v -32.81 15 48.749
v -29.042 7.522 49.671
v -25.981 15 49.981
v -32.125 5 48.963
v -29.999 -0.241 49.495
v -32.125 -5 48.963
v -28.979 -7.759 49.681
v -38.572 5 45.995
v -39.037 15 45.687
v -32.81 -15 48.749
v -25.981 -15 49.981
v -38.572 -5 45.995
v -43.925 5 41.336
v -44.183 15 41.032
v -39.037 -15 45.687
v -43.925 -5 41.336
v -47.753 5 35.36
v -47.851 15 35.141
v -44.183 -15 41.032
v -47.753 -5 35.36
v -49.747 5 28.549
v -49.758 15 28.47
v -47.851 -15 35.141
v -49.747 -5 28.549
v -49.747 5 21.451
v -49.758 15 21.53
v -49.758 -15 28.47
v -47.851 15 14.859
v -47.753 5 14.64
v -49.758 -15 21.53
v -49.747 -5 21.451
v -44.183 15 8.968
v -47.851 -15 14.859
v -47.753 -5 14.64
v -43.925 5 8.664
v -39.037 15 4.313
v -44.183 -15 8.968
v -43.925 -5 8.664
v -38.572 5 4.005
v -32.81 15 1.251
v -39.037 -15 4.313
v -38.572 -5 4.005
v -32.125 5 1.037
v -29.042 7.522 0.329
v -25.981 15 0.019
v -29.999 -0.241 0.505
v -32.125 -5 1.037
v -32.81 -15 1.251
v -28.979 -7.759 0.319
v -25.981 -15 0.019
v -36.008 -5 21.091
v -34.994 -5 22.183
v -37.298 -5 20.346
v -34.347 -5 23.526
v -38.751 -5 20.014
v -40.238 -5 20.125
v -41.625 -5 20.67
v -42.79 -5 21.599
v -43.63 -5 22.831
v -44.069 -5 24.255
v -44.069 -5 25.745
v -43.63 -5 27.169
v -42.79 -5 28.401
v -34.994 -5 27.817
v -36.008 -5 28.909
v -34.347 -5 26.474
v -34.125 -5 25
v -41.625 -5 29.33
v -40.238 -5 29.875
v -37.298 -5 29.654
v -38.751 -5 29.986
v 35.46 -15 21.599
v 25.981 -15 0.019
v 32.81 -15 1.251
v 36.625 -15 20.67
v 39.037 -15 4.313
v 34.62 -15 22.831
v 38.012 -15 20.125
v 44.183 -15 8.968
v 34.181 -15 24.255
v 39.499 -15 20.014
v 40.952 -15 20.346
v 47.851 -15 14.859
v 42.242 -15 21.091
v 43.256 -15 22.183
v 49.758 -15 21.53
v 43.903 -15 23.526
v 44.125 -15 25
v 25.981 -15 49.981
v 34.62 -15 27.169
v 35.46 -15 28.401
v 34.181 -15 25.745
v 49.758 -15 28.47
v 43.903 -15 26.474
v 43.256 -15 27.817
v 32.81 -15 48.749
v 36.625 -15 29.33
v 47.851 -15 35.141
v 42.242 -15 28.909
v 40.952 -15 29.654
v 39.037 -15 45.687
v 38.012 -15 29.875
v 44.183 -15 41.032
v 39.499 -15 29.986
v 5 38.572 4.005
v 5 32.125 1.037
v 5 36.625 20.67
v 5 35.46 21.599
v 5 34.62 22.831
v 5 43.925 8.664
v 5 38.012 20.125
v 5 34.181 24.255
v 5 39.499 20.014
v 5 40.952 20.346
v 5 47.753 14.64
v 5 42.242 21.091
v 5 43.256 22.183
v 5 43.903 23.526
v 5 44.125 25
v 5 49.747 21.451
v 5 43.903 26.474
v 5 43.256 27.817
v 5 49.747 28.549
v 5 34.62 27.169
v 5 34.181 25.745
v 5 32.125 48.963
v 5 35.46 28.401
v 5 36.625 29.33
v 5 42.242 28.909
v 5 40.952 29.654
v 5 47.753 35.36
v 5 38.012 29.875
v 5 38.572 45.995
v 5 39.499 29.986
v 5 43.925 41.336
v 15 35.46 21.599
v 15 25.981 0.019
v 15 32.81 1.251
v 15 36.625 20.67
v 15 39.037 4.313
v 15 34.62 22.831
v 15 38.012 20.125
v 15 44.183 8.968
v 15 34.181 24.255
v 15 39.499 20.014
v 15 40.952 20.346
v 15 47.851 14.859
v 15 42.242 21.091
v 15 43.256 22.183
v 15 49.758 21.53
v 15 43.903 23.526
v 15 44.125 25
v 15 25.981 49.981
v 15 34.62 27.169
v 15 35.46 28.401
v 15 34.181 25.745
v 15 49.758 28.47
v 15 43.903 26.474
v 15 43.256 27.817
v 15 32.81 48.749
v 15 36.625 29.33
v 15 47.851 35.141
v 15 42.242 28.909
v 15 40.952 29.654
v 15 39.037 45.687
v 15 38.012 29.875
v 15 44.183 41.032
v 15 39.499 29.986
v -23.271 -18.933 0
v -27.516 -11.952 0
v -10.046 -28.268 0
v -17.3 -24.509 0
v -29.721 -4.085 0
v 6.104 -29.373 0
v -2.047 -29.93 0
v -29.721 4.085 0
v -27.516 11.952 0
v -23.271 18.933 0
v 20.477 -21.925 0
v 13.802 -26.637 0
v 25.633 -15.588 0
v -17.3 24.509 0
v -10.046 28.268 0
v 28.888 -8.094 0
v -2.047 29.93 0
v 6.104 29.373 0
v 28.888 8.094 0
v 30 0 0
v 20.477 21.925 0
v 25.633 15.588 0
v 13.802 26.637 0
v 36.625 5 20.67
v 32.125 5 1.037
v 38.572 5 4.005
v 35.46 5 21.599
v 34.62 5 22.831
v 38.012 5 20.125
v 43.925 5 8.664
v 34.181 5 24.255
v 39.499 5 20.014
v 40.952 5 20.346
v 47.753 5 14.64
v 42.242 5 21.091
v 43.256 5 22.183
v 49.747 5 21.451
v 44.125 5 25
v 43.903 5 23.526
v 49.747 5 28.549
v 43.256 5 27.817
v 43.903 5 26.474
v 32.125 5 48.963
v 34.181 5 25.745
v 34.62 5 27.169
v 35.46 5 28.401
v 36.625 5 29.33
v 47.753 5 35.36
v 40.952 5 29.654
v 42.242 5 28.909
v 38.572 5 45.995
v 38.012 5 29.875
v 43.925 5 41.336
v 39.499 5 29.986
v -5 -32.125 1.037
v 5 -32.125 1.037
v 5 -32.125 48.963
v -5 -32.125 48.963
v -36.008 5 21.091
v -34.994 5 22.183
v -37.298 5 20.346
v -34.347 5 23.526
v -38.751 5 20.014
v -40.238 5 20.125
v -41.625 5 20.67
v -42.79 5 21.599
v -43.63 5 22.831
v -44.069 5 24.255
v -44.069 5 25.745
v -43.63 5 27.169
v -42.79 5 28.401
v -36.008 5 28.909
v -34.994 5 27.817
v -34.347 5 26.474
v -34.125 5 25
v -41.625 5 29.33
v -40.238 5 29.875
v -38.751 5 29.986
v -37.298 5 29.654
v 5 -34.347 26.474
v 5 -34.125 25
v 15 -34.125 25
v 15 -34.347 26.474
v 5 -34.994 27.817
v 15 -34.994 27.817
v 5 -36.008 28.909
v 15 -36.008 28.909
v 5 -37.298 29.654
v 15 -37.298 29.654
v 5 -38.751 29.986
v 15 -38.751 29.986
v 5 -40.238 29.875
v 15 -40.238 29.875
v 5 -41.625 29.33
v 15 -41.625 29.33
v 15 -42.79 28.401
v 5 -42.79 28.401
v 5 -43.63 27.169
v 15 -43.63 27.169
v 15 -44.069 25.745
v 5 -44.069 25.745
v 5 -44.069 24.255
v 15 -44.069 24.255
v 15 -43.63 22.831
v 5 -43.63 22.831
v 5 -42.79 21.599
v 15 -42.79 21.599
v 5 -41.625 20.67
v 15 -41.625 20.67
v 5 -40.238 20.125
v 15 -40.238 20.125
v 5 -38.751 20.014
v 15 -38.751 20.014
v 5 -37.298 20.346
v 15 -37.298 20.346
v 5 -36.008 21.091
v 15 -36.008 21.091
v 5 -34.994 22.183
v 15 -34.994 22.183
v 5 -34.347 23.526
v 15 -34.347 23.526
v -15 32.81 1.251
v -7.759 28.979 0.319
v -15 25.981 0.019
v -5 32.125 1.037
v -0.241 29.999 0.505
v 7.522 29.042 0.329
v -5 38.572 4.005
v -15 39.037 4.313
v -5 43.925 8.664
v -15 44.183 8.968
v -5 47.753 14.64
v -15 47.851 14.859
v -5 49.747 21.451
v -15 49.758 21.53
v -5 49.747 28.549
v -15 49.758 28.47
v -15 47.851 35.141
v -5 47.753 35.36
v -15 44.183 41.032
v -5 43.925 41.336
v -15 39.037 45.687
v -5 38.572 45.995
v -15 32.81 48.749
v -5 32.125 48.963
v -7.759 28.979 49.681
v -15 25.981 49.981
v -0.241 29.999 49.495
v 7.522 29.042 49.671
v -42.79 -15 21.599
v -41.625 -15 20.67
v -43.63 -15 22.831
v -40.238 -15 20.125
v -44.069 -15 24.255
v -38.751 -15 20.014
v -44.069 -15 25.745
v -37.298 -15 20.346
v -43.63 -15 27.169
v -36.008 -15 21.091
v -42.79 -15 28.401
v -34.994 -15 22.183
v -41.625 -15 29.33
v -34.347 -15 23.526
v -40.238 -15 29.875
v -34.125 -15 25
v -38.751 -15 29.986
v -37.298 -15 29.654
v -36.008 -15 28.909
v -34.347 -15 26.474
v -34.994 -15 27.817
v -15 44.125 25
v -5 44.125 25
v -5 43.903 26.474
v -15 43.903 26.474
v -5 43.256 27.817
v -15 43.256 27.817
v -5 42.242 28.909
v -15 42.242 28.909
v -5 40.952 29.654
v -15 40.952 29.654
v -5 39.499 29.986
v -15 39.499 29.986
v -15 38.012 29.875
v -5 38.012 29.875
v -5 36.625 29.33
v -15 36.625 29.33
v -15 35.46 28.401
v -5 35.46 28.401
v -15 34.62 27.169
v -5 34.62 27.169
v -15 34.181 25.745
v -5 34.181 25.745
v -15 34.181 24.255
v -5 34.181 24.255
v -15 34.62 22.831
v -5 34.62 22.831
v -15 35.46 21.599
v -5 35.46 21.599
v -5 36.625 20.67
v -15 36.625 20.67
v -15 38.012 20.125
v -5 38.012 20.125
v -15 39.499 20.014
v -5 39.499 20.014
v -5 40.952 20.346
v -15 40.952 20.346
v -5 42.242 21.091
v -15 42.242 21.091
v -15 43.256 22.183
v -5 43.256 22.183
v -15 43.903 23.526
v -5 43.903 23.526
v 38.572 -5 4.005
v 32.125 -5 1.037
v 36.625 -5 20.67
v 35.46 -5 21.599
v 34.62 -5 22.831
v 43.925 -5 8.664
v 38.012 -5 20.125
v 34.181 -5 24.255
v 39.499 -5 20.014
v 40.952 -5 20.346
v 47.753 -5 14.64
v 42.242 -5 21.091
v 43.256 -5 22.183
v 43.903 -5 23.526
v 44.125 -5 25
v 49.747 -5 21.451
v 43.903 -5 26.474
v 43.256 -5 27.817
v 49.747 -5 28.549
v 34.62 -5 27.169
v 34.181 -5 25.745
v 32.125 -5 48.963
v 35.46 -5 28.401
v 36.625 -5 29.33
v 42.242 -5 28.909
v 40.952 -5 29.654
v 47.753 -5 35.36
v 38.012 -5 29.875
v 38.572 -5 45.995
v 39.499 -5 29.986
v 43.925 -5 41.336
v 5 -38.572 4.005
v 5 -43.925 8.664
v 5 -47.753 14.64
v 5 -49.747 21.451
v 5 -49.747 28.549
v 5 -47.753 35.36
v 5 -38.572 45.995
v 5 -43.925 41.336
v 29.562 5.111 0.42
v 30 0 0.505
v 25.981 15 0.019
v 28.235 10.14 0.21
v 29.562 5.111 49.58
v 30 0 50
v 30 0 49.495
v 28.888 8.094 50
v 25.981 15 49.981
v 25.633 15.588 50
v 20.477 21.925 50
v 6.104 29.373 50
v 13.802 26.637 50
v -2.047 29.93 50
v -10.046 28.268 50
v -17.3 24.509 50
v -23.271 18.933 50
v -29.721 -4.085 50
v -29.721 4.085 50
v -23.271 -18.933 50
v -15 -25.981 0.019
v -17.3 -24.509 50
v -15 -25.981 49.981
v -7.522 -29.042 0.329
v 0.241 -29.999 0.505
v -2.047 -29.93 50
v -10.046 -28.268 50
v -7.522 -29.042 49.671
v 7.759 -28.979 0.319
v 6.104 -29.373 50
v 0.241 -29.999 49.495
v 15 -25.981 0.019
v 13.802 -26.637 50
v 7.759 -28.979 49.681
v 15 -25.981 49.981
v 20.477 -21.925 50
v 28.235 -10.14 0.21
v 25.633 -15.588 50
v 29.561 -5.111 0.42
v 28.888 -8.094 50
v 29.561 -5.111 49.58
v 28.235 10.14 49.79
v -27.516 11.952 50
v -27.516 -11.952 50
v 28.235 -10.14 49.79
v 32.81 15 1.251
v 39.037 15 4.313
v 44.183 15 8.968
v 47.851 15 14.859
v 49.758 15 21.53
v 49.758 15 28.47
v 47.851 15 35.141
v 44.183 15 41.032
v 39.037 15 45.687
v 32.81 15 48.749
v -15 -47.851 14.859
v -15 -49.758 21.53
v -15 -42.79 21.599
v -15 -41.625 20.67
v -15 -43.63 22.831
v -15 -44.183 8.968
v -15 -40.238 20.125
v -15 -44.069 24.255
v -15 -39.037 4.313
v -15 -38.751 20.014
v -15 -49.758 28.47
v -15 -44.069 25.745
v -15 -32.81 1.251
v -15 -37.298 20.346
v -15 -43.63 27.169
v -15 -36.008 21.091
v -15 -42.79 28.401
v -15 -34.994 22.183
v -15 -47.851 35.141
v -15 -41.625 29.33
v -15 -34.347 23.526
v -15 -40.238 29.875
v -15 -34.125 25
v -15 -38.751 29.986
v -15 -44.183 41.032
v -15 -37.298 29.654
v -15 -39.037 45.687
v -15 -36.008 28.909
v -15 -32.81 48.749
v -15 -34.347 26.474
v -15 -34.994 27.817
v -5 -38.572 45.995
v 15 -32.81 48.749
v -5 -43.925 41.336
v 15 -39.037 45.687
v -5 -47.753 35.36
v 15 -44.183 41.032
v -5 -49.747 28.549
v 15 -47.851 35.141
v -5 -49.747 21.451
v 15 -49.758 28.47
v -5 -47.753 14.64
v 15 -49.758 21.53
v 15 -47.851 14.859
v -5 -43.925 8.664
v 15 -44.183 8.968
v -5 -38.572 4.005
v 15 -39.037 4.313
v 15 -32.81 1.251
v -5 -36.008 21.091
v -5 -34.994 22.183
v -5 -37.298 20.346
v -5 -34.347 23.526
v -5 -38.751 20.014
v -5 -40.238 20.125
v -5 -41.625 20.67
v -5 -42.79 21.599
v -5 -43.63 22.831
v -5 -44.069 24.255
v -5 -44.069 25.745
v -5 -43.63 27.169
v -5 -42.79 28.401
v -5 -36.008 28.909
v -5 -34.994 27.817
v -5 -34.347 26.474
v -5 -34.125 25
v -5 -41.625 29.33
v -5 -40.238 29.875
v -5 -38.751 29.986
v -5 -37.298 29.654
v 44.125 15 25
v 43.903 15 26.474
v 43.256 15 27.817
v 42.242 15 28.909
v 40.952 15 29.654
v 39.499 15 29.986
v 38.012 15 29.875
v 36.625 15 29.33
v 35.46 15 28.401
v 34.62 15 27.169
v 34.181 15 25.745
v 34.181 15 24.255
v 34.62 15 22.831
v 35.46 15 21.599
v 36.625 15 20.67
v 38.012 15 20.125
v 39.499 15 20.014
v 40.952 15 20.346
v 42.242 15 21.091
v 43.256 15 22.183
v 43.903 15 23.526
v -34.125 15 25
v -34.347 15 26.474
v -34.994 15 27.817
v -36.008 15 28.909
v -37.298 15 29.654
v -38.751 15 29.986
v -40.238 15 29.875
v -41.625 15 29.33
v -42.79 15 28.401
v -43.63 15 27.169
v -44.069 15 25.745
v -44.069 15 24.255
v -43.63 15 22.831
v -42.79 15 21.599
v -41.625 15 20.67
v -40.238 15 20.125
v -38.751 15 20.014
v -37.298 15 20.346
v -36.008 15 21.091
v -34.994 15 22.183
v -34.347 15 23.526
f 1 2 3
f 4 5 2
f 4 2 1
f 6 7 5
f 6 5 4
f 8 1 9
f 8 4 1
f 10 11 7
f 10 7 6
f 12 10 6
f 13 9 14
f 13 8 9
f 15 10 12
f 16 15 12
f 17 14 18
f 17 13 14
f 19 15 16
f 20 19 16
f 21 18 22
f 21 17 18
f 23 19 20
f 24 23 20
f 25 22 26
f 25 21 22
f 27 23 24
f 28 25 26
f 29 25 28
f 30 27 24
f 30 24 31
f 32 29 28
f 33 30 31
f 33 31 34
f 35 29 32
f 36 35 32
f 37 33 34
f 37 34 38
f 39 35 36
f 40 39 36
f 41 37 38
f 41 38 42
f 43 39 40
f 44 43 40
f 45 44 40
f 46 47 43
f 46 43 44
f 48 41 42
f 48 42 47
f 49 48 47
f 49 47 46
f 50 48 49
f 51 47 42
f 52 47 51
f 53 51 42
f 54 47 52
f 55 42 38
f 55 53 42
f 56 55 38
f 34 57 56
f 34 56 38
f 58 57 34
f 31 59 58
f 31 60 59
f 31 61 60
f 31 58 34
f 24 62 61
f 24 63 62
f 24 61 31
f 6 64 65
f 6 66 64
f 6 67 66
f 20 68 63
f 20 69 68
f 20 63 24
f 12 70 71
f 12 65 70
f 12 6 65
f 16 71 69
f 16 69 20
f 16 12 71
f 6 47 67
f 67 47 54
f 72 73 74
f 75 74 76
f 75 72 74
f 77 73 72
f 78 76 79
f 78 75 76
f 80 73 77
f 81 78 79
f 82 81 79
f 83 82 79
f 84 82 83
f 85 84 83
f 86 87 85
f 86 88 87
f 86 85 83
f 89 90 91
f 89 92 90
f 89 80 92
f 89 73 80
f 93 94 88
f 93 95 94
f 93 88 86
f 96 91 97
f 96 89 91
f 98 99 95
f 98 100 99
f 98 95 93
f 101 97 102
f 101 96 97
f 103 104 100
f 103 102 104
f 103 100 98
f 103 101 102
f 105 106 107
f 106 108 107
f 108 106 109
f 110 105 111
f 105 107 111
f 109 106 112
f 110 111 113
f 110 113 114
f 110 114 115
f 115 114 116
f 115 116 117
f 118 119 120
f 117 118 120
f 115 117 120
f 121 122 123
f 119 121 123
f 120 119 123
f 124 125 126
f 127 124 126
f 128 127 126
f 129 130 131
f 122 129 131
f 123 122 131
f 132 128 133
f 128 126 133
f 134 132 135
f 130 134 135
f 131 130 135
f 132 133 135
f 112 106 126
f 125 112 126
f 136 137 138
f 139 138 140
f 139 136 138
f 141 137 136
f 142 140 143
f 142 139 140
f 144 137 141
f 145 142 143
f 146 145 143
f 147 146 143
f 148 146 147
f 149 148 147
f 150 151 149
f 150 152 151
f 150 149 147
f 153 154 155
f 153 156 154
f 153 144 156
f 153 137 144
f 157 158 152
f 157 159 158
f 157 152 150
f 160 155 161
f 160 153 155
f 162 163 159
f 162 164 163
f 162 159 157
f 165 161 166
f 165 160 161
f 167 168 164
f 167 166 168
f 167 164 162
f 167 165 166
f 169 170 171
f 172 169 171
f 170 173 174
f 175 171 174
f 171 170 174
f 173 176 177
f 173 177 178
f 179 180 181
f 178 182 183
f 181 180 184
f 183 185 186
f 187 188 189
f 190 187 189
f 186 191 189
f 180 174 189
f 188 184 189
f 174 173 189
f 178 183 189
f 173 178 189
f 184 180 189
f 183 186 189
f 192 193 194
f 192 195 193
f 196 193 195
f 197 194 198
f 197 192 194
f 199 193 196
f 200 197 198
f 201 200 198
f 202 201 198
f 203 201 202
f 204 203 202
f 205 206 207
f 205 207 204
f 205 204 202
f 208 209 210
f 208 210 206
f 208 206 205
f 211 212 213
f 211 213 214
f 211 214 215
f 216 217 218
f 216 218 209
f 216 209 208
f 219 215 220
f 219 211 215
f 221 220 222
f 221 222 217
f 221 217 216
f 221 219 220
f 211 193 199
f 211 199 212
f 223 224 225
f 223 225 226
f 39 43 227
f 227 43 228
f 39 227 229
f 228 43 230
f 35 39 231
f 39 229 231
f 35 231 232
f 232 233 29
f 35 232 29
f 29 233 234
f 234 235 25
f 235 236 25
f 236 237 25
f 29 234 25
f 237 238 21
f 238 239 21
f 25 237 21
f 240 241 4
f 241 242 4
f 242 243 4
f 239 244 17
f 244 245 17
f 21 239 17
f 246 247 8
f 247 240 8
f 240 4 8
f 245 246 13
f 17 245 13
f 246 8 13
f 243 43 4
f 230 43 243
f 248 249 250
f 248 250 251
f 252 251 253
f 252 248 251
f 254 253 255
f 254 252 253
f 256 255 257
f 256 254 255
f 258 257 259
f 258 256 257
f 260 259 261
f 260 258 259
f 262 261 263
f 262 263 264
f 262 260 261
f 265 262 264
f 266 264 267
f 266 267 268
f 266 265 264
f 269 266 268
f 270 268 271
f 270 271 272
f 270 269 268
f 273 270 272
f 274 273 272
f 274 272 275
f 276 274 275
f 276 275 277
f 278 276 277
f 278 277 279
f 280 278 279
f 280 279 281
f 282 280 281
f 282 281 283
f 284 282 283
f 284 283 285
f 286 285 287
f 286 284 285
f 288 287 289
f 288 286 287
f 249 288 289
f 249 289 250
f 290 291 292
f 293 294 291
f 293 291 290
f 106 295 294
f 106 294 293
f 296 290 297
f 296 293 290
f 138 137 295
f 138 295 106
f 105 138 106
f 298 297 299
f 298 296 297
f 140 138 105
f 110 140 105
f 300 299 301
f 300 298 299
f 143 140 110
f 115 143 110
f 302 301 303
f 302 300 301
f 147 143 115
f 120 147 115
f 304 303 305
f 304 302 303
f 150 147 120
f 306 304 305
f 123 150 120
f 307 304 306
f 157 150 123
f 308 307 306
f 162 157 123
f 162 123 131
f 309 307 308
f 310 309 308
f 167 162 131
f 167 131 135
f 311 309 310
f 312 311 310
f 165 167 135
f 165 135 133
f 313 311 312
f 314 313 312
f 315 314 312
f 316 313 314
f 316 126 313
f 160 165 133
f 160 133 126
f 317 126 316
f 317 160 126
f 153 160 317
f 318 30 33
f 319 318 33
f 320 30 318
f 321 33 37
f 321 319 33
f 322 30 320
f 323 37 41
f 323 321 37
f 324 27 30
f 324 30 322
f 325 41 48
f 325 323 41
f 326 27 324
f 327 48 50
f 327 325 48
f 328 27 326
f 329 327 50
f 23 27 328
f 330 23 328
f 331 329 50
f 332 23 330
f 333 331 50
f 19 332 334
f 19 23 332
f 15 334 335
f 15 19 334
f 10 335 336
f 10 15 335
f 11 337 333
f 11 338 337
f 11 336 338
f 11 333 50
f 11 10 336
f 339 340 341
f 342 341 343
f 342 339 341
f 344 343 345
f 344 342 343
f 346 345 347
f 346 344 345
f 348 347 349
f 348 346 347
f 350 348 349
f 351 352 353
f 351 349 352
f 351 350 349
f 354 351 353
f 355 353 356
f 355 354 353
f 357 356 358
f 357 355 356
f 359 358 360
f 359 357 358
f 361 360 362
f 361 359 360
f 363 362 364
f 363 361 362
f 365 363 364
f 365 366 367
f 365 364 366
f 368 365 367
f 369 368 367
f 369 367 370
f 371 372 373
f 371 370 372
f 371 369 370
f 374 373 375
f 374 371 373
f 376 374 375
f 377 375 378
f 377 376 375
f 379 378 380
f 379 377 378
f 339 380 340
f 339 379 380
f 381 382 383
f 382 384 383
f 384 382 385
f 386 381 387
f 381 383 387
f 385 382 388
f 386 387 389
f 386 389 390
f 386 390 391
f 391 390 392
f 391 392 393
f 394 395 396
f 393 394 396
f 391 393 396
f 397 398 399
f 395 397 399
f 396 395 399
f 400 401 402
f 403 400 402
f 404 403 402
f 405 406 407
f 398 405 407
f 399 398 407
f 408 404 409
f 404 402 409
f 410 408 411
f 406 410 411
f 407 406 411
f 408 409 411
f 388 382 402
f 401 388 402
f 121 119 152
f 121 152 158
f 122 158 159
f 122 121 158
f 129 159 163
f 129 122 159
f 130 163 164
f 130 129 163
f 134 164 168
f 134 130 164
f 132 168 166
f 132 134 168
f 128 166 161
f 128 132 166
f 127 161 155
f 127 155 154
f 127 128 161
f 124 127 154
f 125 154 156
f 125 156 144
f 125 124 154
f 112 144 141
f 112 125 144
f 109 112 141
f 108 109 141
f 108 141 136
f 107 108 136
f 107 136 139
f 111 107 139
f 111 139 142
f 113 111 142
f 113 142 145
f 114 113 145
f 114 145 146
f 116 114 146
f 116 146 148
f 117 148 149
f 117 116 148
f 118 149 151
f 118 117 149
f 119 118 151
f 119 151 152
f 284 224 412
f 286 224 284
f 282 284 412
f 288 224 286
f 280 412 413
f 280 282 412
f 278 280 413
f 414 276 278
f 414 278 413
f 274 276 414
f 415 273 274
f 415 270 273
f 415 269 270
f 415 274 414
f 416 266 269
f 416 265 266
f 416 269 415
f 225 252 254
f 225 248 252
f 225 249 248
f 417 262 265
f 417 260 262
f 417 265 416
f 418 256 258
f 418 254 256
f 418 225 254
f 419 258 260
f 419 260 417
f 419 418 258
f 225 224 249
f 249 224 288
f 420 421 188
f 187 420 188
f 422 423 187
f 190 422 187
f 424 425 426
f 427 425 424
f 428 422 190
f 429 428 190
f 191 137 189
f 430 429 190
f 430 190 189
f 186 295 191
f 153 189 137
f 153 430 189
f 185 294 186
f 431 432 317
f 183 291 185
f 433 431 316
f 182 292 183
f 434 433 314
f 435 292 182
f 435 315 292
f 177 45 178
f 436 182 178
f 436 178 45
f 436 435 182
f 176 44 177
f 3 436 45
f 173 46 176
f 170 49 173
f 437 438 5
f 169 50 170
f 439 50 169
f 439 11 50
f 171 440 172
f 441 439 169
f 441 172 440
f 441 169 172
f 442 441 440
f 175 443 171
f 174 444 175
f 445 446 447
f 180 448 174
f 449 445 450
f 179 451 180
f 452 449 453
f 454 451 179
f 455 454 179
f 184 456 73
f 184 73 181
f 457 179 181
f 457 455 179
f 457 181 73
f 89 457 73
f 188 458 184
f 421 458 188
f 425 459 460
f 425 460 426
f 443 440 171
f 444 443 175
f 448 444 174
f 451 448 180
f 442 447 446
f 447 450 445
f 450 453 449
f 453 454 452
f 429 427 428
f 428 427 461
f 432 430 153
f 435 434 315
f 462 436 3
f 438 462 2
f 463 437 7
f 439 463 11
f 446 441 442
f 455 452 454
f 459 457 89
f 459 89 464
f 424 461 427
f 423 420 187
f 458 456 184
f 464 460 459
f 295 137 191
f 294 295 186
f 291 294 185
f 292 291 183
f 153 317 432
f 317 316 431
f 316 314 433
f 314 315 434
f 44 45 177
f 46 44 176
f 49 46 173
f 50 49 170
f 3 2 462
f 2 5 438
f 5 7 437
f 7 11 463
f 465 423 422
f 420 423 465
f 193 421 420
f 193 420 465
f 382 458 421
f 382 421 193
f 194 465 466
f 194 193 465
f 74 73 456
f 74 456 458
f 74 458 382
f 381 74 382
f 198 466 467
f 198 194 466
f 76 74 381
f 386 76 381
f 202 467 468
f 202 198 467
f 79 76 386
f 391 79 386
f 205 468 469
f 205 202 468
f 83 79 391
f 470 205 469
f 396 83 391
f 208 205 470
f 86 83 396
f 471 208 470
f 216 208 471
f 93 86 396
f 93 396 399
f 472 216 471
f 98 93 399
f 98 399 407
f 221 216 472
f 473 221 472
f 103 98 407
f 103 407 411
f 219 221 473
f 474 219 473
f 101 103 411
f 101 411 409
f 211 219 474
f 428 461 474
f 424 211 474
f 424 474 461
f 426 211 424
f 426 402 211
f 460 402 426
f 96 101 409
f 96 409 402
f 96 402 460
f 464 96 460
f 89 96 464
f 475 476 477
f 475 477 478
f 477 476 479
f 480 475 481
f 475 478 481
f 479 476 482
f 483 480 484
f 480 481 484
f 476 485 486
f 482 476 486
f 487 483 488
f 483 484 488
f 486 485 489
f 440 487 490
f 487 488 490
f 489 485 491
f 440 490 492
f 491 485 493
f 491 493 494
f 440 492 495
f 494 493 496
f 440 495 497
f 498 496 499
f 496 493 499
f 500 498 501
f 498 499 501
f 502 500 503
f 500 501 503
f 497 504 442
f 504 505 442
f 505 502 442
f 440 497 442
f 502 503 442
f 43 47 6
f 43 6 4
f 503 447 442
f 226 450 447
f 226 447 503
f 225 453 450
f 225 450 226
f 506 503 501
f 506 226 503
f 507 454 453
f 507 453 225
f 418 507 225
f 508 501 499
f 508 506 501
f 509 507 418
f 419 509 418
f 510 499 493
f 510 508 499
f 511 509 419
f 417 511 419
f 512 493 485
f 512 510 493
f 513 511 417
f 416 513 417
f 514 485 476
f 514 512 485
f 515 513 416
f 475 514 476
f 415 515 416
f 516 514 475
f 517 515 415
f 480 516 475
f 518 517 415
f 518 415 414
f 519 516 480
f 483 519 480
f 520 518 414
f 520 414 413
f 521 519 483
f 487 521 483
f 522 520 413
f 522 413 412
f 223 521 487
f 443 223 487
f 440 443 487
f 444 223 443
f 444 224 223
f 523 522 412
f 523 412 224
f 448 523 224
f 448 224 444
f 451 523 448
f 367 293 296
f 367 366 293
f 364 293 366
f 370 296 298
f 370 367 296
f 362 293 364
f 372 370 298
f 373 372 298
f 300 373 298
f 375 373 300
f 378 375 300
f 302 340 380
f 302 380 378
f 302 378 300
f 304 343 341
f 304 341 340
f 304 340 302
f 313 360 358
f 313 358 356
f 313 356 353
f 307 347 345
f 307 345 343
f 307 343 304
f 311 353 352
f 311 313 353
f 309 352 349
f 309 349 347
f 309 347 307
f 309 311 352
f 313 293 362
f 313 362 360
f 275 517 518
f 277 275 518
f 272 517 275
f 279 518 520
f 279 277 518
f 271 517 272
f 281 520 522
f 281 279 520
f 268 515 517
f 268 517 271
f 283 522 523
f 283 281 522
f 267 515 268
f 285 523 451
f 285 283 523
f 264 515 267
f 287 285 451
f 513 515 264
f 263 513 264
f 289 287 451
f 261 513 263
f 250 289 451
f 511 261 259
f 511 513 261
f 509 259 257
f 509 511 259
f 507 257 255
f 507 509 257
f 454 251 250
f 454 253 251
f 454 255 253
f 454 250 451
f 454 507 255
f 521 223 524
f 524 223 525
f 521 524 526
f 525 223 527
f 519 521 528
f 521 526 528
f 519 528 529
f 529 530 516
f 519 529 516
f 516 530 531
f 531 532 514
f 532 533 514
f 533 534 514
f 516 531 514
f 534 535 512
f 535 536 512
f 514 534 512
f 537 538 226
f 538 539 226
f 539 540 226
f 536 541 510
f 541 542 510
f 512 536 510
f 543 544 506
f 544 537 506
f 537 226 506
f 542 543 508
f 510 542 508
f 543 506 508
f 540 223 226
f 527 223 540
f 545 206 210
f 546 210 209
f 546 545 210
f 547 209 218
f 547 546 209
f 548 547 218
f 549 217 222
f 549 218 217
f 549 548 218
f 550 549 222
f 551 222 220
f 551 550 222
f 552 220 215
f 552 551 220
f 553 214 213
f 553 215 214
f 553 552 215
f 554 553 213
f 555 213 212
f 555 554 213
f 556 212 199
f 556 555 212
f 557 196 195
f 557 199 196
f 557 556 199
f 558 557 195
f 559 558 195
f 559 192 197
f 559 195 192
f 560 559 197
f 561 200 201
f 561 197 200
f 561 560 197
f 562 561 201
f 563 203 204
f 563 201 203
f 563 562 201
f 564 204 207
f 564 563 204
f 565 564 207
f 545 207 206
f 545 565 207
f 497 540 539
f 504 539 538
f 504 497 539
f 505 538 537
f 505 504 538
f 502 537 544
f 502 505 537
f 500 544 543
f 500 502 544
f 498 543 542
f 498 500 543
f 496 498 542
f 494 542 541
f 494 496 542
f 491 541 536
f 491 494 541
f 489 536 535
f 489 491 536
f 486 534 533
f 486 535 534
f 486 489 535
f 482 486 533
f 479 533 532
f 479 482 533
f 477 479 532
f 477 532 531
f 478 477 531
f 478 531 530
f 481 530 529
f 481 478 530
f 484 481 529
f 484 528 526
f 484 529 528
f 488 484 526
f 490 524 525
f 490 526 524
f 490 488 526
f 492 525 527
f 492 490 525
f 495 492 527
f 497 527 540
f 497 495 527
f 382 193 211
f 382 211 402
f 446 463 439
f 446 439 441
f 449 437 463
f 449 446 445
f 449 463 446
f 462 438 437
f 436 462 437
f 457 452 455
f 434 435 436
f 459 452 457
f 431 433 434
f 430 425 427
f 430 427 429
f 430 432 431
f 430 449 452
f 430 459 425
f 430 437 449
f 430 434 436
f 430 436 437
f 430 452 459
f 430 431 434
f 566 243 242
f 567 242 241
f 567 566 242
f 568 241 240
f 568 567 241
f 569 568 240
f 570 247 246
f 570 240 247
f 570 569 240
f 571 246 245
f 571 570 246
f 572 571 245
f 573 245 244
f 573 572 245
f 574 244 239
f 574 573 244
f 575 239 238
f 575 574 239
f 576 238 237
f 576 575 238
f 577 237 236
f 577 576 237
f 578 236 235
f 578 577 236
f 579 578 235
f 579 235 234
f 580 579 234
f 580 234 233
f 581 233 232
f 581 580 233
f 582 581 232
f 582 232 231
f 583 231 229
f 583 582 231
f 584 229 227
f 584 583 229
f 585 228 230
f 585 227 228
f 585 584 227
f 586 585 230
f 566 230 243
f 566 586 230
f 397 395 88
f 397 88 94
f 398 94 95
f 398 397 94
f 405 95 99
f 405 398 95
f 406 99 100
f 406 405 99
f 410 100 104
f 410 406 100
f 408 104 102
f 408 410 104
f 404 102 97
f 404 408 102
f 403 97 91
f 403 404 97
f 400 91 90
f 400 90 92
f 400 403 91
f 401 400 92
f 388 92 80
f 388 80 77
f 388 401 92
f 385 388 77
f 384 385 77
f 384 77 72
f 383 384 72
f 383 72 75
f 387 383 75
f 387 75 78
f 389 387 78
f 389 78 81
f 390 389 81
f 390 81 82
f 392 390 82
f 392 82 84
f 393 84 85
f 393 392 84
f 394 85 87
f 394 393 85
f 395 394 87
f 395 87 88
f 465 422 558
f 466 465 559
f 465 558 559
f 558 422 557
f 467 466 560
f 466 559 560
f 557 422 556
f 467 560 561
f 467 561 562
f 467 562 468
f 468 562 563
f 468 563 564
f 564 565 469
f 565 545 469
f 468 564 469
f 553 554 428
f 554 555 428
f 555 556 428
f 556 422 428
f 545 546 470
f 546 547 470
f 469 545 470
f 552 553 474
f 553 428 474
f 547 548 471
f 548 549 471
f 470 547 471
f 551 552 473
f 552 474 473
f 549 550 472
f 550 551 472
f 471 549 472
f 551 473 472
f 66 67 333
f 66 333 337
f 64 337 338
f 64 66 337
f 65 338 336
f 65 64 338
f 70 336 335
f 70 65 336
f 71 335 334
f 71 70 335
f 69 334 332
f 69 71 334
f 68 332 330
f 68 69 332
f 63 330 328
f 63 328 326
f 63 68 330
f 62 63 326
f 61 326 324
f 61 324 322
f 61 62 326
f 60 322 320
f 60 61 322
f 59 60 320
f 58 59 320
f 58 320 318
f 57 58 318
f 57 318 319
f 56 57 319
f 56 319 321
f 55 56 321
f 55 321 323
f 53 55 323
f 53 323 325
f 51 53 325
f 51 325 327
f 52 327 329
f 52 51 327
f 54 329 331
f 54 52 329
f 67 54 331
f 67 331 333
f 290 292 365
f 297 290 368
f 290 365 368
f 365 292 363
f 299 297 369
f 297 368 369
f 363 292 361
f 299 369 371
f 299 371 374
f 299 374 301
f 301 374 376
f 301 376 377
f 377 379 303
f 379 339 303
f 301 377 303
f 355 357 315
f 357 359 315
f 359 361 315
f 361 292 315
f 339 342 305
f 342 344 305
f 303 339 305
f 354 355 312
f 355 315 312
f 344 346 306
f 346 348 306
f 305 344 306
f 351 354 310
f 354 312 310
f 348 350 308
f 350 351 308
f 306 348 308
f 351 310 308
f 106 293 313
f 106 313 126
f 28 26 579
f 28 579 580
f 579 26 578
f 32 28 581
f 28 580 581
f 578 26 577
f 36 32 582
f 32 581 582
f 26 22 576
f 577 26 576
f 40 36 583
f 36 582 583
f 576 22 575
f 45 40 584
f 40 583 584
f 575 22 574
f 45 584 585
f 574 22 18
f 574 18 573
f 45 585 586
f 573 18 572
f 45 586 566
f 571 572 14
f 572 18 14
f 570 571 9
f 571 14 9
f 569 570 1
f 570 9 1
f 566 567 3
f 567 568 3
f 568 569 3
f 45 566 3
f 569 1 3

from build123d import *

# Parameters (mm, degrees)
F0_W            = 25
F0_H            = 50
F0_R            = 5
F1_DEPTH        = 15
F1_DEPTH_BACK   = 15
F2_COUNT        = 2
F2_ANGLE        = 90
F3_R            = 30
F4_DEPTH        = 50
F5_W            = 10
F5_H            = 64.0000030398
F6_DEPTH        = 50.0010001
F6_COPIES_COUNT = 4


# Not quite as in the source:
# - a pattern or mirror of a feature is missing from the dataset's text; its kind, count and spacing are read off the source's solid


with BuildPart() as f1:
    # F0 (on Front) → F1 (new body, two sides)
    with BuildSketch(Plane.XZ) as f1_sk:
        with Locations((-12.5, 25)):
            Rectangle(F0_W, F0_H)
        with Locations((12.5, 25)):
            Rectangle(F0_W, F0_H)
        with BuildLine():
            ThreePointArc((-25, 50), (-50, 25), (-25, 0))
            Line((-25, 0), (-25, 50))
        make_face()
        with Locations((-39.1249991953, 25)):
            Circle(F0_R, mode=Mode.SUBTRACT)
        with BuildLine():
            Line((25, 50), (25, 0))
            ThreePointArc((25, 0), (50, 25), (25, 50))
        make_face()
        with Locations((39.1249991953, 25)):
            Circle(F0_R, mode=Mode.SUBTRACT)
    extrude(amount=F1_DEPTH)
    extrude(f1_sk.sketch, amount=-F1_DEPTH_BACK)

    # F2: F1 ×2 about axis
    f2_axis = Axis((0, 0, 10.6249991804), (0, 0, 1))


with BuildPart() as f1_1:
    add(f1.part)
    for i in range(1, F2_COUNT):
        add(f1.part.rotate(f2_axis, i * F2_ANGLE / (F2_COUNT - 1)))

    # F3 (on face) → F4 (join, through all)
    with BuildSketch(Plane.XY.offset(50)):
        Circle(F3_R)
    extrude(amount=-F4_DEPTH)

    # F5 (on face) → F6 (cut, through all)
    with BuildSketch(Plane.XY.offset(50)):
        with Locations((0, 64.1250014305)):
            Rectangle(F5_W, F5_H)
    f6 = extrude(amount=-F6_DEPTH, mode=Mode.SUBTRACT)

    # F6_copies: F6 ×4 about axis
    f6_copies_axis = Axis((0, 0, 0), (0, 0, 1))
    for i in range(1, F6_COPIES_COUNT):
        add(f6.rotate(f6_copies_axis, i * 360 / F6_COPIES_COUNT), mode=Mode.SUBTRACT)


solid = f1_1.part
